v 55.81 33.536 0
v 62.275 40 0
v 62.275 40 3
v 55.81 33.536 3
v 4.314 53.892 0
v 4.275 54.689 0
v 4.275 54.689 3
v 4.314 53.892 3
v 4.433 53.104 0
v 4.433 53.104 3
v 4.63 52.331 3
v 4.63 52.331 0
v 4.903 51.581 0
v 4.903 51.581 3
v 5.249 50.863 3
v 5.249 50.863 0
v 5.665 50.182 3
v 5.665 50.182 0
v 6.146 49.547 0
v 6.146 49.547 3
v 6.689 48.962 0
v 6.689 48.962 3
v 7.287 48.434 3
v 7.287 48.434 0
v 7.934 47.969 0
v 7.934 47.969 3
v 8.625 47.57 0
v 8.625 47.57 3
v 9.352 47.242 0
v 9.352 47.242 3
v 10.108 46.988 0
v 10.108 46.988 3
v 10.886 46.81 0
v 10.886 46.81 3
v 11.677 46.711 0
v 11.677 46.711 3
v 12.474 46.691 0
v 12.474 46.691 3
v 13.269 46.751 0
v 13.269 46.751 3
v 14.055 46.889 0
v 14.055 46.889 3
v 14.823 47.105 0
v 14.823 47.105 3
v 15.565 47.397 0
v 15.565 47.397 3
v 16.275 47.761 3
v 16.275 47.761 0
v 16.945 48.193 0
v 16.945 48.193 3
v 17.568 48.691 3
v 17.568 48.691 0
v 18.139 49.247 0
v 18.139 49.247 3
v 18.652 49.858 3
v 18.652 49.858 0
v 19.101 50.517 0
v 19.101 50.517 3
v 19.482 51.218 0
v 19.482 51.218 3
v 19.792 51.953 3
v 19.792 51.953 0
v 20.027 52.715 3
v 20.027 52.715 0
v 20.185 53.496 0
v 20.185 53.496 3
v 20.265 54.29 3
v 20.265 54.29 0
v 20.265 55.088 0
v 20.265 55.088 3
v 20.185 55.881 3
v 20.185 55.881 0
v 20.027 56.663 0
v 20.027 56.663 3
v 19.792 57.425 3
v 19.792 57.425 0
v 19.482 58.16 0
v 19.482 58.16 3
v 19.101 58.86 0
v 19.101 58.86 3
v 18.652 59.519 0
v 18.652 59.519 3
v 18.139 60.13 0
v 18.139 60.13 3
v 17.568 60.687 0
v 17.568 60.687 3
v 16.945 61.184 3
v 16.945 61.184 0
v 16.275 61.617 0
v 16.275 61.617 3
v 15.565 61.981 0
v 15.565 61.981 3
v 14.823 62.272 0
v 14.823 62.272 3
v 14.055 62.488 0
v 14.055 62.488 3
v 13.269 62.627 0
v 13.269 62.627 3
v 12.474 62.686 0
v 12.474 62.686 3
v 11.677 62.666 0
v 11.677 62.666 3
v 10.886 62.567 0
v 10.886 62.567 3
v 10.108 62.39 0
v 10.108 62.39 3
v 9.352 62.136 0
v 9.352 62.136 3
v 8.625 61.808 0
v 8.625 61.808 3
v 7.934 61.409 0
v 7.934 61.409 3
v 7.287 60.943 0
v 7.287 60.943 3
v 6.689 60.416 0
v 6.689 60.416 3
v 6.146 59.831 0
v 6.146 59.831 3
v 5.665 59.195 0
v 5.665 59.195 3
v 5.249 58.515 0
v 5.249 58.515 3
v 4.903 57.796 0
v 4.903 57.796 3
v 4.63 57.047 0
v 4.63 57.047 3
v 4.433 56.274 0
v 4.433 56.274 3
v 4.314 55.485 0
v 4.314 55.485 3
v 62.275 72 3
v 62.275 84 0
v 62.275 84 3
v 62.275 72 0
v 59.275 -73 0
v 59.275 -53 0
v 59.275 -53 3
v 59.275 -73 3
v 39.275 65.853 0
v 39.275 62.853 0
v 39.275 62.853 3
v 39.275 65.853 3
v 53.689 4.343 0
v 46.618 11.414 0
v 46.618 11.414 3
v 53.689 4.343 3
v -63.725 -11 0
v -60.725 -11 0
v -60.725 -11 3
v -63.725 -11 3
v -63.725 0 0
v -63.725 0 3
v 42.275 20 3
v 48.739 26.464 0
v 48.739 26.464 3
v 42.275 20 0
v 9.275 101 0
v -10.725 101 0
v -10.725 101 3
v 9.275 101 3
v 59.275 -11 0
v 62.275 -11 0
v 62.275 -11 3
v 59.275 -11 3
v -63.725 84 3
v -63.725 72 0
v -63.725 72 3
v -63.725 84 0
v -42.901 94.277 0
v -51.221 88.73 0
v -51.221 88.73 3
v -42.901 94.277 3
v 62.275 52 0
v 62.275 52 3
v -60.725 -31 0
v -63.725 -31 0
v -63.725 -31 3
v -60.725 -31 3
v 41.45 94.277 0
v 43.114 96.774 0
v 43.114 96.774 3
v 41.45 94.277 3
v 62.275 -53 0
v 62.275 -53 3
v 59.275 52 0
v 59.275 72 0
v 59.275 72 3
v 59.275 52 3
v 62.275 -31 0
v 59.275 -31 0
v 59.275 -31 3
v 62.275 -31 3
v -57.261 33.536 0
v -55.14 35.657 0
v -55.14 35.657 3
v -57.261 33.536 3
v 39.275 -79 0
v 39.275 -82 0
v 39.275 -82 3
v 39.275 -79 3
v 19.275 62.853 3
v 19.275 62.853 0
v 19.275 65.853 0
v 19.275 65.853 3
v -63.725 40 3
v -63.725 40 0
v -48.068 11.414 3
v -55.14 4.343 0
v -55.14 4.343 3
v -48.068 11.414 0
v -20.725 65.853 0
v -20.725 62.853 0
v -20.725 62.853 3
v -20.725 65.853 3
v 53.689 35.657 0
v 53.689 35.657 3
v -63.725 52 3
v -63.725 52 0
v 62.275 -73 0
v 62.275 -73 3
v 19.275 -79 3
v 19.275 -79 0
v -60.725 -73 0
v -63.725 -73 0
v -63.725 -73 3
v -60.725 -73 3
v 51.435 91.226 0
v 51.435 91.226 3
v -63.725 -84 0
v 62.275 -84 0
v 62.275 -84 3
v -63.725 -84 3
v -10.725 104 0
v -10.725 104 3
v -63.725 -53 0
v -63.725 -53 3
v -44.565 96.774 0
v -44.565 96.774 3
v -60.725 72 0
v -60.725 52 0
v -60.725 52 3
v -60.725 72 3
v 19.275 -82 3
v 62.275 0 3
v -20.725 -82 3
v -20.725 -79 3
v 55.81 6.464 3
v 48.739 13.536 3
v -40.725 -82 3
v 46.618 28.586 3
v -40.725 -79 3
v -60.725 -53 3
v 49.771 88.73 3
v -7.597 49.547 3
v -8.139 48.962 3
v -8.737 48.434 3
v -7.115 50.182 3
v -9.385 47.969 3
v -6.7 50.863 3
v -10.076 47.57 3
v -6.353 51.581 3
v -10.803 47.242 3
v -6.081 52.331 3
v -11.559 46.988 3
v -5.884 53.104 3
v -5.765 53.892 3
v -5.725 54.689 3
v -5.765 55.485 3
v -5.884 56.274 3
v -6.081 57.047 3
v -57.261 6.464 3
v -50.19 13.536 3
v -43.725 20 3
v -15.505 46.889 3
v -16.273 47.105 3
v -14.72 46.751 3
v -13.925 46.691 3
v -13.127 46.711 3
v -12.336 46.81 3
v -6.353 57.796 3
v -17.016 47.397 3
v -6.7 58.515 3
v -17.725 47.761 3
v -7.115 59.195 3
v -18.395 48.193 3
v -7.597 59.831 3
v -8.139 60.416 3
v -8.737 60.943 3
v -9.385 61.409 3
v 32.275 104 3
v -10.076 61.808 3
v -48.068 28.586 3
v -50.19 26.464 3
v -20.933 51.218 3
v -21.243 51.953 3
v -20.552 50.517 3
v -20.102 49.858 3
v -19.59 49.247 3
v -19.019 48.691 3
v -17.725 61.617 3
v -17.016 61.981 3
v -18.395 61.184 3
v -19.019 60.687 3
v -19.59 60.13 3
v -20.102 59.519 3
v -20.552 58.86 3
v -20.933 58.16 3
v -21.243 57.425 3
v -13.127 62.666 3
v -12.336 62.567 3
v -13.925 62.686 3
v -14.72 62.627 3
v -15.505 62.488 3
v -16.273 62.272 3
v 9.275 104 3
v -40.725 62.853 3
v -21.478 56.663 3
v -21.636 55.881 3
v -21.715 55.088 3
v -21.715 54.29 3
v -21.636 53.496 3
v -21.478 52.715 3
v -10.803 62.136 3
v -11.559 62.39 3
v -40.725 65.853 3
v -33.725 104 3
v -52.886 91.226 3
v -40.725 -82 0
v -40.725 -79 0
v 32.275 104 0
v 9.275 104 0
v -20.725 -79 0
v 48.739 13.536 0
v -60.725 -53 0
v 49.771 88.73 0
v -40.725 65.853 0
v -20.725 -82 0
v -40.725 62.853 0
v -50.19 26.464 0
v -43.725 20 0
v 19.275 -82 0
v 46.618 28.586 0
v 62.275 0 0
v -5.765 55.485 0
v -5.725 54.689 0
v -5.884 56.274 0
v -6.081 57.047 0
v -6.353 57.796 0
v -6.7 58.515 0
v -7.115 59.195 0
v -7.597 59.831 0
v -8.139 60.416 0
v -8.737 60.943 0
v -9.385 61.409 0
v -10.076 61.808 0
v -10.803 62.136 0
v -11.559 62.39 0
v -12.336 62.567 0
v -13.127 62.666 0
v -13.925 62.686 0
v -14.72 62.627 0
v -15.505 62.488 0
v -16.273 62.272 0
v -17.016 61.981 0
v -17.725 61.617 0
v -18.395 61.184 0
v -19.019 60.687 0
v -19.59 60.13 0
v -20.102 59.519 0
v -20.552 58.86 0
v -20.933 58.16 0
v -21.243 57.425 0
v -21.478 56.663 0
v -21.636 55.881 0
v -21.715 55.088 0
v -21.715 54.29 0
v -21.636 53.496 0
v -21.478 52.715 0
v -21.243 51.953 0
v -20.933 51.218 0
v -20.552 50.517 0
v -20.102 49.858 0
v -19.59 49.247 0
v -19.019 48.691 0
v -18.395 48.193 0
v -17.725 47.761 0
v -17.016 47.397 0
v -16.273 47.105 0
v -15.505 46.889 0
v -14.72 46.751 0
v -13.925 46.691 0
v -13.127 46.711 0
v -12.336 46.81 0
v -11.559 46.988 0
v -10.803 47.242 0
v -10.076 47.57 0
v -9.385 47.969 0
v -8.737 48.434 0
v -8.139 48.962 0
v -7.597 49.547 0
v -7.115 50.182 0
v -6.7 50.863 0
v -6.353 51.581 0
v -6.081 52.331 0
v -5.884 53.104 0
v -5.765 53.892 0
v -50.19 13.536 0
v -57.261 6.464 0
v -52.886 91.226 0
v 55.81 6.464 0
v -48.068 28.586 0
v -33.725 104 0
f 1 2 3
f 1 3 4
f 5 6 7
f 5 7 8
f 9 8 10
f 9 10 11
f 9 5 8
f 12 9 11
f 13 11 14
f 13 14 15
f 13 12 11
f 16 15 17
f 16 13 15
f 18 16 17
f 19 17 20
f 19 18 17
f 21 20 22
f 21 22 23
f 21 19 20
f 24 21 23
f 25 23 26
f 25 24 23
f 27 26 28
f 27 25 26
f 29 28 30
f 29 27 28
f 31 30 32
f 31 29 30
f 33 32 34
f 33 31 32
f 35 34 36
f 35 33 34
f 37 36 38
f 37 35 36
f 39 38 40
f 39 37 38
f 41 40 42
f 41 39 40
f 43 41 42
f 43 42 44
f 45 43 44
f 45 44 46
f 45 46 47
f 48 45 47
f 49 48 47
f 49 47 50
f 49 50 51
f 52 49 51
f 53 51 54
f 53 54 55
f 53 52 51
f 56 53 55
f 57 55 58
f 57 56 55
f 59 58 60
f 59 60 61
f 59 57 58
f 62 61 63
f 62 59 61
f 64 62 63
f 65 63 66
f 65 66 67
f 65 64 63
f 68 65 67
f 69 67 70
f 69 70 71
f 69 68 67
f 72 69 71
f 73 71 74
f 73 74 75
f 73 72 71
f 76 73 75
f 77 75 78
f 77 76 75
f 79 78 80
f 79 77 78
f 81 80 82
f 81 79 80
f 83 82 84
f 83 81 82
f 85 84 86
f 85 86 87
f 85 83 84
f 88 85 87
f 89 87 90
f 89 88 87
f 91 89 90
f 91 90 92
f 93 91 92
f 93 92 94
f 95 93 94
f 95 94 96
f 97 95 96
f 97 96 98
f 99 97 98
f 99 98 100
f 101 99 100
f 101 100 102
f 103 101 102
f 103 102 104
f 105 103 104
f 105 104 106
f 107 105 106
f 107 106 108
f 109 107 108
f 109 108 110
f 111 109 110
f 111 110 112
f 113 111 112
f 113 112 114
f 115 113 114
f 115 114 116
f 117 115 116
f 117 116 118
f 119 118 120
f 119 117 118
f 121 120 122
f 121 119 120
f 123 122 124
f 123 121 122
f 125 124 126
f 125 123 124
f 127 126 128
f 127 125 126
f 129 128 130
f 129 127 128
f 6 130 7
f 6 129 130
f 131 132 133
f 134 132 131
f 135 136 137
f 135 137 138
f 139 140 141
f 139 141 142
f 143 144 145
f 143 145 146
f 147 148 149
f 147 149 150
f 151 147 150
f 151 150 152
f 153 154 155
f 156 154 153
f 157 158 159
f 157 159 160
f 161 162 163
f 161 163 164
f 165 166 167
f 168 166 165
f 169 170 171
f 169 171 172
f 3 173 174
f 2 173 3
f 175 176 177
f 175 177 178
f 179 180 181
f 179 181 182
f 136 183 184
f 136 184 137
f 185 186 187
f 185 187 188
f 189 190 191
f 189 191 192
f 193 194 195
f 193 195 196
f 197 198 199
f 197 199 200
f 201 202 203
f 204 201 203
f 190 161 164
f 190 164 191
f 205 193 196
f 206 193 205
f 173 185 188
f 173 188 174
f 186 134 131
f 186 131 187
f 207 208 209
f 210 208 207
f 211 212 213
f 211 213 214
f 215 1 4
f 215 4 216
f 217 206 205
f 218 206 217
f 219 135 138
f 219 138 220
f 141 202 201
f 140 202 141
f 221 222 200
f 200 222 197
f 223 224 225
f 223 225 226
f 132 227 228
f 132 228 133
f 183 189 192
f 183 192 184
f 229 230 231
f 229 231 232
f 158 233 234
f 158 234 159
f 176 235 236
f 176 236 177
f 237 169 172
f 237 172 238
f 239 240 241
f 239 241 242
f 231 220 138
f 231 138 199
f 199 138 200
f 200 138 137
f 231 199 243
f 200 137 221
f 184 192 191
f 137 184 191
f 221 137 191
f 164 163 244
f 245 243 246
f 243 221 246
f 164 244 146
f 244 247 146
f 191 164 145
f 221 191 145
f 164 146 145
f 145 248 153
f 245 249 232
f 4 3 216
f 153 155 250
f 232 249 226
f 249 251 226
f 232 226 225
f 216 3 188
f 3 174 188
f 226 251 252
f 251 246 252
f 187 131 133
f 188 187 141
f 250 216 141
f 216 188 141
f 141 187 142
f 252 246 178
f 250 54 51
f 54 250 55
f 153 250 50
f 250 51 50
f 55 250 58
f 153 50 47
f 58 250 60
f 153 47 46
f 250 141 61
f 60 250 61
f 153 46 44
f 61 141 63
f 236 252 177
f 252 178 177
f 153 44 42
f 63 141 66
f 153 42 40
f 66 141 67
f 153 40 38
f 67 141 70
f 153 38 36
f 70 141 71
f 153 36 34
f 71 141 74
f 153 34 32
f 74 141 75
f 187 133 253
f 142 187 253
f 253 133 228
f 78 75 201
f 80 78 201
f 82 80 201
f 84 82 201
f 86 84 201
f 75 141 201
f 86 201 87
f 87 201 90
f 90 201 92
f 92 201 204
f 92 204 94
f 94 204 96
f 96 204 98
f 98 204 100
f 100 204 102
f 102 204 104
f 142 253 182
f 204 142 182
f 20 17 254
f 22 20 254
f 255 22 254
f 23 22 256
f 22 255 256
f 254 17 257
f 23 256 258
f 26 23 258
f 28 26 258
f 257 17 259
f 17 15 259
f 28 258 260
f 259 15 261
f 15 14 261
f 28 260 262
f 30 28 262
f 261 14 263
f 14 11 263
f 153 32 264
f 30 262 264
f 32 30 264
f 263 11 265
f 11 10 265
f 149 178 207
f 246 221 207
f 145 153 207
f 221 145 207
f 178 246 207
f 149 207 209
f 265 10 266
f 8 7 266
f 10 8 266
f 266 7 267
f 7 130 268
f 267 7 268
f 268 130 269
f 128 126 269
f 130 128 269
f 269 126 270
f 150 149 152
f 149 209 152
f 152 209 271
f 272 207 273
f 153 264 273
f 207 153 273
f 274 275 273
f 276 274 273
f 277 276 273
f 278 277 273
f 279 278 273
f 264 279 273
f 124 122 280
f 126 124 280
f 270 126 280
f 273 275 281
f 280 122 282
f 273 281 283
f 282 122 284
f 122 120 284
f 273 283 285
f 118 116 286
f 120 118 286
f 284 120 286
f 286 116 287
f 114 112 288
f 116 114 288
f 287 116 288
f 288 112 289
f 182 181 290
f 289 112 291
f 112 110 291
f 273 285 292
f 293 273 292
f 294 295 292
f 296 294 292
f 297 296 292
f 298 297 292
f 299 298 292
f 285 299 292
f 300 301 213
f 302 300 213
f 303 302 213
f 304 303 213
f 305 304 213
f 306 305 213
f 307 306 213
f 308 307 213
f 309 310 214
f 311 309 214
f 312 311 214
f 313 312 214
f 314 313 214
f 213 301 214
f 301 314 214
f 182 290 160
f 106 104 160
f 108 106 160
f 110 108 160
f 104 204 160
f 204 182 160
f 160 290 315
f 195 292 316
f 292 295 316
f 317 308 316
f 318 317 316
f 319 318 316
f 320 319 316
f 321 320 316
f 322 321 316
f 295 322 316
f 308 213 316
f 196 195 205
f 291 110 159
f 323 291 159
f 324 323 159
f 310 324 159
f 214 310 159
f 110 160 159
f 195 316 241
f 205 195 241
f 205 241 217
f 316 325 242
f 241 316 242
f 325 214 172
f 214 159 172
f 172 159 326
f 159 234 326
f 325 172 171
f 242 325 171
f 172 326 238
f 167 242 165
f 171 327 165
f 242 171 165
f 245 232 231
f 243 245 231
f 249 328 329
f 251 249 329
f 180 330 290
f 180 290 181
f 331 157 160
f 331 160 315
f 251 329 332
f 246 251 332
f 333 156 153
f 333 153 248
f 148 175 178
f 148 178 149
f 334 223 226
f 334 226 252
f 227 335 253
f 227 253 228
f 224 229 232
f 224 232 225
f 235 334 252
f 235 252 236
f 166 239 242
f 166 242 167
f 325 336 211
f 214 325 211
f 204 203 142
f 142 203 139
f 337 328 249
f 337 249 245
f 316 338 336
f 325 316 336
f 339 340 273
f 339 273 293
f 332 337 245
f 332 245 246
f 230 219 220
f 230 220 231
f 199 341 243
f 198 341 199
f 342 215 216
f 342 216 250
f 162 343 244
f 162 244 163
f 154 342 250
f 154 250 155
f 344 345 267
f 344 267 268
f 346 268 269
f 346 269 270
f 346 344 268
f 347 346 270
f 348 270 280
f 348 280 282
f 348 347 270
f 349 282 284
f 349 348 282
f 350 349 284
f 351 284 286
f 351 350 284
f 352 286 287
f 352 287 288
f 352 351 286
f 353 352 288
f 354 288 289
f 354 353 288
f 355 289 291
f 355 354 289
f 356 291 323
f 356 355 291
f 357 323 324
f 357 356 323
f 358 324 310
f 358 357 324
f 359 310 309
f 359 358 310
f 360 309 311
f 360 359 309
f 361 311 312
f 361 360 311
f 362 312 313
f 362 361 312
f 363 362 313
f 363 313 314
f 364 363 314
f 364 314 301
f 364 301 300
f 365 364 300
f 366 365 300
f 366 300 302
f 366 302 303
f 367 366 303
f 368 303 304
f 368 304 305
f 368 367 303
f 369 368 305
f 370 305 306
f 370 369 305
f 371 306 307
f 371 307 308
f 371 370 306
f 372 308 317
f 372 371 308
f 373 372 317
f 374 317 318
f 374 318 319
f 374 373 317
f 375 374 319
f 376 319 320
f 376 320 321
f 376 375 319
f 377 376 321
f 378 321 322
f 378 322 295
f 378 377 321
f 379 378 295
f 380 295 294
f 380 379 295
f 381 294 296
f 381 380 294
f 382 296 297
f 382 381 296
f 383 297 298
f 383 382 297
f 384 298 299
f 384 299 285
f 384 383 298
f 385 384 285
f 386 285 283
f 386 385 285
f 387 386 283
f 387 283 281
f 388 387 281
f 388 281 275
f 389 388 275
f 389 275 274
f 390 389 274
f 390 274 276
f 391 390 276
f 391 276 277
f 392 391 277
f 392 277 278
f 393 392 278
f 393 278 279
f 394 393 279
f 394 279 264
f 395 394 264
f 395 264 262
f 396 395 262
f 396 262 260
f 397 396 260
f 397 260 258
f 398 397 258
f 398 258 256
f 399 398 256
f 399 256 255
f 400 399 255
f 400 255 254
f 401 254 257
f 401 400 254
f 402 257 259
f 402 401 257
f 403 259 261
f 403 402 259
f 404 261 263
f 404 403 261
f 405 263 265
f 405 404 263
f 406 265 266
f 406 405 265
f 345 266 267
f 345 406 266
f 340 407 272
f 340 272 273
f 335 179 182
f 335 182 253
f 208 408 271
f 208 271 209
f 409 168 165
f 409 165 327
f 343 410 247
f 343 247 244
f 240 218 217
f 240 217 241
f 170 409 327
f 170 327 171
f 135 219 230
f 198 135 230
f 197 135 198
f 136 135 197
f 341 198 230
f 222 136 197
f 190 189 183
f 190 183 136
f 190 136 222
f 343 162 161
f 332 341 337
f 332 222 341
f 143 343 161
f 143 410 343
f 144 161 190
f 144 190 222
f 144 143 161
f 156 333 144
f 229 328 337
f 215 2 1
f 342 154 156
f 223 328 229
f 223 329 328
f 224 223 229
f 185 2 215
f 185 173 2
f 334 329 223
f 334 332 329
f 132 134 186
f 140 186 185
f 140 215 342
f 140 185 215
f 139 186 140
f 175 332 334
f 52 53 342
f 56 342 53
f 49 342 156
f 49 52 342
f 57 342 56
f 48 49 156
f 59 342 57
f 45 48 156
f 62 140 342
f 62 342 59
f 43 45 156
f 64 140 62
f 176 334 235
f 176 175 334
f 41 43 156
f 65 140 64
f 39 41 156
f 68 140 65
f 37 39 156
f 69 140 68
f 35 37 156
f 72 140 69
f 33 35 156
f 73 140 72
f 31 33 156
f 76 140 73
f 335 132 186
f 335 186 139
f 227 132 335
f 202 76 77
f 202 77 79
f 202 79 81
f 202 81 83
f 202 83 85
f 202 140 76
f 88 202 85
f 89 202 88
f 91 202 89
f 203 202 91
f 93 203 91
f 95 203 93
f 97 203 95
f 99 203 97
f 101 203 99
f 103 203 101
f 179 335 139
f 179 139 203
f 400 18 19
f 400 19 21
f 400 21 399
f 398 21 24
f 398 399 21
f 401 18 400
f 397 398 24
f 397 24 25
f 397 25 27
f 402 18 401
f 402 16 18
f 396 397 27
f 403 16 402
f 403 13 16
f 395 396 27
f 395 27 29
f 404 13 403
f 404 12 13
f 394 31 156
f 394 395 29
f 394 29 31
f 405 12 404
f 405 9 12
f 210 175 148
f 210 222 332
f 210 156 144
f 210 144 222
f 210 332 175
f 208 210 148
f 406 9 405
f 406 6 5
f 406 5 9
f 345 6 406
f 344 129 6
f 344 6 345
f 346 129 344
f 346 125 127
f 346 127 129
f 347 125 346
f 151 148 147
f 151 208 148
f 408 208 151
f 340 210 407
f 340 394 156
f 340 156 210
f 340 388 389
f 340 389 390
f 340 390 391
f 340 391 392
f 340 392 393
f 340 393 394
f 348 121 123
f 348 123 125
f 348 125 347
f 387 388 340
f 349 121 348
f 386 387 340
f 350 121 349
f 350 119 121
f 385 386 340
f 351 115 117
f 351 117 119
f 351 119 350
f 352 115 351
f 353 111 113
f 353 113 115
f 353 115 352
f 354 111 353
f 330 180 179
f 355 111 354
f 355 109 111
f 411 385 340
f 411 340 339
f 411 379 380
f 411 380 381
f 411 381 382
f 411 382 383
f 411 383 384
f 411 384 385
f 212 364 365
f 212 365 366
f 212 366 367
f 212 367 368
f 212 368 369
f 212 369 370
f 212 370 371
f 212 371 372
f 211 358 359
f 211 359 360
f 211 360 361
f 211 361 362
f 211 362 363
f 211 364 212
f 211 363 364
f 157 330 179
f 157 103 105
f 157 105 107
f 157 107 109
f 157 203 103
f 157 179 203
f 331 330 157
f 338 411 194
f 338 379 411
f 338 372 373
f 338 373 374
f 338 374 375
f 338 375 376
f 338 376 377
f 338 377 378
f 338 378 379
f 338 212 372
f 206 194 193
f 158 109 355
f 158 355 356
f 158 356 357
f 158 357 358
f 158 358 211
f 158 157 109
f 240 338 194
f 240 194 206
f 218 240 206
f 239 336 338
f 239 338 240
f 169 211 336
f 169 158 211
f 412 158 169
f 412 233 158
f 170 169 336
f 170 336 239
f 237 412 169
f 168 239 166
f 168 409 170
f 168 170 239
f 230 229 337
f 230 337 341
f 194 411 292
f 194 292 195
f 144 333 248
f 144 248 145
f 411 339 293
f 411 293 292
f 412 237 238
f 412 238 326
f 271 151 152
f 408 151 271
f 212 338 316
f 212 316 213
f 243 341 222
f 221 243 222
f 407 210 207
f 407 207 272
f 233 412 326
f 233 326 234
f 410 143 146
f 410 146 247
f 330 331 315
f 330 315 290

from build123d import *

# Parameters (mm, degrees)
SKETCH1_R           = 8
SKETCH1_W           = 20
SKETCH1_H           = 3
BOSS_EXTRUDE1_DEPTH = 3


with BuildPart() as part:
    # Sketch1 → Boss-Extrude1 (new body)
    with BuildSketch(Plane.XY):
        Polygon((62.274694919, 0), (62.274694919, -11), (59.274694919, -11), (59.274694919, -31), (62.274694919, -31), (62.274694919, -53), (59.274694919, -53), (59.274694919, -73), (62.274694919, -73), (62.274694919, -84), (-63.725305081, -84), (-63.725305081, -73), (-60.725305081, -73), (-60.725305081, -53), (-63.725305081, -53), (-63.725305081, -31), (-60.725305081, -31), (-60.725305081, -11), (-63.725305081, -11), (-63.725305081, 0), (-57.260838987, 6.464466094), (-55.139518643, 4.343145751), (-48.068450831, 11.414213562), (-50.189771175, 13.535533906), (-43.725305081, 20), (-50.189771175, 26.464466094), (-48.068450831, 28.585786438), (-55.139518643, 35.656854249), (-57.260838987, 33.535533906), (-63.725305081, 40), (-63.725305081, 52), (-60.725305081, 52), (-60.725305081, 72), (-63.725305081, 72), (-63.725305081, 84), (-52.885556553, 91.226499019), (-51.221455964, 88.730348136), (-42.90095302, 94.277350098), (-44.565053609, 96.773500981), (-33.725305081, 104), (-10.725305081, 104), (-10.725305081, 101), (9.274694919, 101), (9.274694919, 104), (32.274694919, 104), (43.114443447, 96.773500981), (41.450342859, 94.277350098), (49.770845802, 88.730348136), (51.434946391, 91.226499019), (62.274694919, 84), (62.274694919, 72), (59.274694919, 72), (59.274694919, 52), (62.274694919, 52), (62.274694919, 40), (55.810228825, 33.535533906), (53.688908482, 35.656854249), (46.61784067, 28.585786438), (48.739161013, 26.464466094), (42.274694919, 20), (48.739161013, 13.535533906), (46.61784067, 11.414213562), (53.688908482, 4.343145751), (55.810228825, 6.464466094), align=None)
        with Locations((-13.725305081, 54.688830471)):
            Circle(SKETCH1_R, mode=Mode.SUBTRACT)
        with Locations(Location((12.274694919, 54.688830471, 0), (0, 0, 180))):
            Circle(SKETCH1_R, mode=Mode.SUBTRACT)
        with Locations((29.274694919, -80.5)):
            Rectangle(SKETCH1_W, SKETCH1_H, mode=Mode.SUBTRACT)
        with Locations((-30.725305081, -80.5)):
            Rectangle(SKETCH1_W, SKETCH1_H, mode=Mode.SUBTRACT)
        with Locations((29.274694919, 64.35252343)):
            Rectangle(SKETCH1_W, SKETCH1_H, mode=Mode.SUBTRACT)
        with Locations((-30.725305081, 64.35252343)):
            Rectangle(SKETCH1_W, SKETCH1_H, mode=Mode.SUBTRACT)
    extrude(amount=BOSS_EXTRUDE1_DEPTH)


solid = part.part
